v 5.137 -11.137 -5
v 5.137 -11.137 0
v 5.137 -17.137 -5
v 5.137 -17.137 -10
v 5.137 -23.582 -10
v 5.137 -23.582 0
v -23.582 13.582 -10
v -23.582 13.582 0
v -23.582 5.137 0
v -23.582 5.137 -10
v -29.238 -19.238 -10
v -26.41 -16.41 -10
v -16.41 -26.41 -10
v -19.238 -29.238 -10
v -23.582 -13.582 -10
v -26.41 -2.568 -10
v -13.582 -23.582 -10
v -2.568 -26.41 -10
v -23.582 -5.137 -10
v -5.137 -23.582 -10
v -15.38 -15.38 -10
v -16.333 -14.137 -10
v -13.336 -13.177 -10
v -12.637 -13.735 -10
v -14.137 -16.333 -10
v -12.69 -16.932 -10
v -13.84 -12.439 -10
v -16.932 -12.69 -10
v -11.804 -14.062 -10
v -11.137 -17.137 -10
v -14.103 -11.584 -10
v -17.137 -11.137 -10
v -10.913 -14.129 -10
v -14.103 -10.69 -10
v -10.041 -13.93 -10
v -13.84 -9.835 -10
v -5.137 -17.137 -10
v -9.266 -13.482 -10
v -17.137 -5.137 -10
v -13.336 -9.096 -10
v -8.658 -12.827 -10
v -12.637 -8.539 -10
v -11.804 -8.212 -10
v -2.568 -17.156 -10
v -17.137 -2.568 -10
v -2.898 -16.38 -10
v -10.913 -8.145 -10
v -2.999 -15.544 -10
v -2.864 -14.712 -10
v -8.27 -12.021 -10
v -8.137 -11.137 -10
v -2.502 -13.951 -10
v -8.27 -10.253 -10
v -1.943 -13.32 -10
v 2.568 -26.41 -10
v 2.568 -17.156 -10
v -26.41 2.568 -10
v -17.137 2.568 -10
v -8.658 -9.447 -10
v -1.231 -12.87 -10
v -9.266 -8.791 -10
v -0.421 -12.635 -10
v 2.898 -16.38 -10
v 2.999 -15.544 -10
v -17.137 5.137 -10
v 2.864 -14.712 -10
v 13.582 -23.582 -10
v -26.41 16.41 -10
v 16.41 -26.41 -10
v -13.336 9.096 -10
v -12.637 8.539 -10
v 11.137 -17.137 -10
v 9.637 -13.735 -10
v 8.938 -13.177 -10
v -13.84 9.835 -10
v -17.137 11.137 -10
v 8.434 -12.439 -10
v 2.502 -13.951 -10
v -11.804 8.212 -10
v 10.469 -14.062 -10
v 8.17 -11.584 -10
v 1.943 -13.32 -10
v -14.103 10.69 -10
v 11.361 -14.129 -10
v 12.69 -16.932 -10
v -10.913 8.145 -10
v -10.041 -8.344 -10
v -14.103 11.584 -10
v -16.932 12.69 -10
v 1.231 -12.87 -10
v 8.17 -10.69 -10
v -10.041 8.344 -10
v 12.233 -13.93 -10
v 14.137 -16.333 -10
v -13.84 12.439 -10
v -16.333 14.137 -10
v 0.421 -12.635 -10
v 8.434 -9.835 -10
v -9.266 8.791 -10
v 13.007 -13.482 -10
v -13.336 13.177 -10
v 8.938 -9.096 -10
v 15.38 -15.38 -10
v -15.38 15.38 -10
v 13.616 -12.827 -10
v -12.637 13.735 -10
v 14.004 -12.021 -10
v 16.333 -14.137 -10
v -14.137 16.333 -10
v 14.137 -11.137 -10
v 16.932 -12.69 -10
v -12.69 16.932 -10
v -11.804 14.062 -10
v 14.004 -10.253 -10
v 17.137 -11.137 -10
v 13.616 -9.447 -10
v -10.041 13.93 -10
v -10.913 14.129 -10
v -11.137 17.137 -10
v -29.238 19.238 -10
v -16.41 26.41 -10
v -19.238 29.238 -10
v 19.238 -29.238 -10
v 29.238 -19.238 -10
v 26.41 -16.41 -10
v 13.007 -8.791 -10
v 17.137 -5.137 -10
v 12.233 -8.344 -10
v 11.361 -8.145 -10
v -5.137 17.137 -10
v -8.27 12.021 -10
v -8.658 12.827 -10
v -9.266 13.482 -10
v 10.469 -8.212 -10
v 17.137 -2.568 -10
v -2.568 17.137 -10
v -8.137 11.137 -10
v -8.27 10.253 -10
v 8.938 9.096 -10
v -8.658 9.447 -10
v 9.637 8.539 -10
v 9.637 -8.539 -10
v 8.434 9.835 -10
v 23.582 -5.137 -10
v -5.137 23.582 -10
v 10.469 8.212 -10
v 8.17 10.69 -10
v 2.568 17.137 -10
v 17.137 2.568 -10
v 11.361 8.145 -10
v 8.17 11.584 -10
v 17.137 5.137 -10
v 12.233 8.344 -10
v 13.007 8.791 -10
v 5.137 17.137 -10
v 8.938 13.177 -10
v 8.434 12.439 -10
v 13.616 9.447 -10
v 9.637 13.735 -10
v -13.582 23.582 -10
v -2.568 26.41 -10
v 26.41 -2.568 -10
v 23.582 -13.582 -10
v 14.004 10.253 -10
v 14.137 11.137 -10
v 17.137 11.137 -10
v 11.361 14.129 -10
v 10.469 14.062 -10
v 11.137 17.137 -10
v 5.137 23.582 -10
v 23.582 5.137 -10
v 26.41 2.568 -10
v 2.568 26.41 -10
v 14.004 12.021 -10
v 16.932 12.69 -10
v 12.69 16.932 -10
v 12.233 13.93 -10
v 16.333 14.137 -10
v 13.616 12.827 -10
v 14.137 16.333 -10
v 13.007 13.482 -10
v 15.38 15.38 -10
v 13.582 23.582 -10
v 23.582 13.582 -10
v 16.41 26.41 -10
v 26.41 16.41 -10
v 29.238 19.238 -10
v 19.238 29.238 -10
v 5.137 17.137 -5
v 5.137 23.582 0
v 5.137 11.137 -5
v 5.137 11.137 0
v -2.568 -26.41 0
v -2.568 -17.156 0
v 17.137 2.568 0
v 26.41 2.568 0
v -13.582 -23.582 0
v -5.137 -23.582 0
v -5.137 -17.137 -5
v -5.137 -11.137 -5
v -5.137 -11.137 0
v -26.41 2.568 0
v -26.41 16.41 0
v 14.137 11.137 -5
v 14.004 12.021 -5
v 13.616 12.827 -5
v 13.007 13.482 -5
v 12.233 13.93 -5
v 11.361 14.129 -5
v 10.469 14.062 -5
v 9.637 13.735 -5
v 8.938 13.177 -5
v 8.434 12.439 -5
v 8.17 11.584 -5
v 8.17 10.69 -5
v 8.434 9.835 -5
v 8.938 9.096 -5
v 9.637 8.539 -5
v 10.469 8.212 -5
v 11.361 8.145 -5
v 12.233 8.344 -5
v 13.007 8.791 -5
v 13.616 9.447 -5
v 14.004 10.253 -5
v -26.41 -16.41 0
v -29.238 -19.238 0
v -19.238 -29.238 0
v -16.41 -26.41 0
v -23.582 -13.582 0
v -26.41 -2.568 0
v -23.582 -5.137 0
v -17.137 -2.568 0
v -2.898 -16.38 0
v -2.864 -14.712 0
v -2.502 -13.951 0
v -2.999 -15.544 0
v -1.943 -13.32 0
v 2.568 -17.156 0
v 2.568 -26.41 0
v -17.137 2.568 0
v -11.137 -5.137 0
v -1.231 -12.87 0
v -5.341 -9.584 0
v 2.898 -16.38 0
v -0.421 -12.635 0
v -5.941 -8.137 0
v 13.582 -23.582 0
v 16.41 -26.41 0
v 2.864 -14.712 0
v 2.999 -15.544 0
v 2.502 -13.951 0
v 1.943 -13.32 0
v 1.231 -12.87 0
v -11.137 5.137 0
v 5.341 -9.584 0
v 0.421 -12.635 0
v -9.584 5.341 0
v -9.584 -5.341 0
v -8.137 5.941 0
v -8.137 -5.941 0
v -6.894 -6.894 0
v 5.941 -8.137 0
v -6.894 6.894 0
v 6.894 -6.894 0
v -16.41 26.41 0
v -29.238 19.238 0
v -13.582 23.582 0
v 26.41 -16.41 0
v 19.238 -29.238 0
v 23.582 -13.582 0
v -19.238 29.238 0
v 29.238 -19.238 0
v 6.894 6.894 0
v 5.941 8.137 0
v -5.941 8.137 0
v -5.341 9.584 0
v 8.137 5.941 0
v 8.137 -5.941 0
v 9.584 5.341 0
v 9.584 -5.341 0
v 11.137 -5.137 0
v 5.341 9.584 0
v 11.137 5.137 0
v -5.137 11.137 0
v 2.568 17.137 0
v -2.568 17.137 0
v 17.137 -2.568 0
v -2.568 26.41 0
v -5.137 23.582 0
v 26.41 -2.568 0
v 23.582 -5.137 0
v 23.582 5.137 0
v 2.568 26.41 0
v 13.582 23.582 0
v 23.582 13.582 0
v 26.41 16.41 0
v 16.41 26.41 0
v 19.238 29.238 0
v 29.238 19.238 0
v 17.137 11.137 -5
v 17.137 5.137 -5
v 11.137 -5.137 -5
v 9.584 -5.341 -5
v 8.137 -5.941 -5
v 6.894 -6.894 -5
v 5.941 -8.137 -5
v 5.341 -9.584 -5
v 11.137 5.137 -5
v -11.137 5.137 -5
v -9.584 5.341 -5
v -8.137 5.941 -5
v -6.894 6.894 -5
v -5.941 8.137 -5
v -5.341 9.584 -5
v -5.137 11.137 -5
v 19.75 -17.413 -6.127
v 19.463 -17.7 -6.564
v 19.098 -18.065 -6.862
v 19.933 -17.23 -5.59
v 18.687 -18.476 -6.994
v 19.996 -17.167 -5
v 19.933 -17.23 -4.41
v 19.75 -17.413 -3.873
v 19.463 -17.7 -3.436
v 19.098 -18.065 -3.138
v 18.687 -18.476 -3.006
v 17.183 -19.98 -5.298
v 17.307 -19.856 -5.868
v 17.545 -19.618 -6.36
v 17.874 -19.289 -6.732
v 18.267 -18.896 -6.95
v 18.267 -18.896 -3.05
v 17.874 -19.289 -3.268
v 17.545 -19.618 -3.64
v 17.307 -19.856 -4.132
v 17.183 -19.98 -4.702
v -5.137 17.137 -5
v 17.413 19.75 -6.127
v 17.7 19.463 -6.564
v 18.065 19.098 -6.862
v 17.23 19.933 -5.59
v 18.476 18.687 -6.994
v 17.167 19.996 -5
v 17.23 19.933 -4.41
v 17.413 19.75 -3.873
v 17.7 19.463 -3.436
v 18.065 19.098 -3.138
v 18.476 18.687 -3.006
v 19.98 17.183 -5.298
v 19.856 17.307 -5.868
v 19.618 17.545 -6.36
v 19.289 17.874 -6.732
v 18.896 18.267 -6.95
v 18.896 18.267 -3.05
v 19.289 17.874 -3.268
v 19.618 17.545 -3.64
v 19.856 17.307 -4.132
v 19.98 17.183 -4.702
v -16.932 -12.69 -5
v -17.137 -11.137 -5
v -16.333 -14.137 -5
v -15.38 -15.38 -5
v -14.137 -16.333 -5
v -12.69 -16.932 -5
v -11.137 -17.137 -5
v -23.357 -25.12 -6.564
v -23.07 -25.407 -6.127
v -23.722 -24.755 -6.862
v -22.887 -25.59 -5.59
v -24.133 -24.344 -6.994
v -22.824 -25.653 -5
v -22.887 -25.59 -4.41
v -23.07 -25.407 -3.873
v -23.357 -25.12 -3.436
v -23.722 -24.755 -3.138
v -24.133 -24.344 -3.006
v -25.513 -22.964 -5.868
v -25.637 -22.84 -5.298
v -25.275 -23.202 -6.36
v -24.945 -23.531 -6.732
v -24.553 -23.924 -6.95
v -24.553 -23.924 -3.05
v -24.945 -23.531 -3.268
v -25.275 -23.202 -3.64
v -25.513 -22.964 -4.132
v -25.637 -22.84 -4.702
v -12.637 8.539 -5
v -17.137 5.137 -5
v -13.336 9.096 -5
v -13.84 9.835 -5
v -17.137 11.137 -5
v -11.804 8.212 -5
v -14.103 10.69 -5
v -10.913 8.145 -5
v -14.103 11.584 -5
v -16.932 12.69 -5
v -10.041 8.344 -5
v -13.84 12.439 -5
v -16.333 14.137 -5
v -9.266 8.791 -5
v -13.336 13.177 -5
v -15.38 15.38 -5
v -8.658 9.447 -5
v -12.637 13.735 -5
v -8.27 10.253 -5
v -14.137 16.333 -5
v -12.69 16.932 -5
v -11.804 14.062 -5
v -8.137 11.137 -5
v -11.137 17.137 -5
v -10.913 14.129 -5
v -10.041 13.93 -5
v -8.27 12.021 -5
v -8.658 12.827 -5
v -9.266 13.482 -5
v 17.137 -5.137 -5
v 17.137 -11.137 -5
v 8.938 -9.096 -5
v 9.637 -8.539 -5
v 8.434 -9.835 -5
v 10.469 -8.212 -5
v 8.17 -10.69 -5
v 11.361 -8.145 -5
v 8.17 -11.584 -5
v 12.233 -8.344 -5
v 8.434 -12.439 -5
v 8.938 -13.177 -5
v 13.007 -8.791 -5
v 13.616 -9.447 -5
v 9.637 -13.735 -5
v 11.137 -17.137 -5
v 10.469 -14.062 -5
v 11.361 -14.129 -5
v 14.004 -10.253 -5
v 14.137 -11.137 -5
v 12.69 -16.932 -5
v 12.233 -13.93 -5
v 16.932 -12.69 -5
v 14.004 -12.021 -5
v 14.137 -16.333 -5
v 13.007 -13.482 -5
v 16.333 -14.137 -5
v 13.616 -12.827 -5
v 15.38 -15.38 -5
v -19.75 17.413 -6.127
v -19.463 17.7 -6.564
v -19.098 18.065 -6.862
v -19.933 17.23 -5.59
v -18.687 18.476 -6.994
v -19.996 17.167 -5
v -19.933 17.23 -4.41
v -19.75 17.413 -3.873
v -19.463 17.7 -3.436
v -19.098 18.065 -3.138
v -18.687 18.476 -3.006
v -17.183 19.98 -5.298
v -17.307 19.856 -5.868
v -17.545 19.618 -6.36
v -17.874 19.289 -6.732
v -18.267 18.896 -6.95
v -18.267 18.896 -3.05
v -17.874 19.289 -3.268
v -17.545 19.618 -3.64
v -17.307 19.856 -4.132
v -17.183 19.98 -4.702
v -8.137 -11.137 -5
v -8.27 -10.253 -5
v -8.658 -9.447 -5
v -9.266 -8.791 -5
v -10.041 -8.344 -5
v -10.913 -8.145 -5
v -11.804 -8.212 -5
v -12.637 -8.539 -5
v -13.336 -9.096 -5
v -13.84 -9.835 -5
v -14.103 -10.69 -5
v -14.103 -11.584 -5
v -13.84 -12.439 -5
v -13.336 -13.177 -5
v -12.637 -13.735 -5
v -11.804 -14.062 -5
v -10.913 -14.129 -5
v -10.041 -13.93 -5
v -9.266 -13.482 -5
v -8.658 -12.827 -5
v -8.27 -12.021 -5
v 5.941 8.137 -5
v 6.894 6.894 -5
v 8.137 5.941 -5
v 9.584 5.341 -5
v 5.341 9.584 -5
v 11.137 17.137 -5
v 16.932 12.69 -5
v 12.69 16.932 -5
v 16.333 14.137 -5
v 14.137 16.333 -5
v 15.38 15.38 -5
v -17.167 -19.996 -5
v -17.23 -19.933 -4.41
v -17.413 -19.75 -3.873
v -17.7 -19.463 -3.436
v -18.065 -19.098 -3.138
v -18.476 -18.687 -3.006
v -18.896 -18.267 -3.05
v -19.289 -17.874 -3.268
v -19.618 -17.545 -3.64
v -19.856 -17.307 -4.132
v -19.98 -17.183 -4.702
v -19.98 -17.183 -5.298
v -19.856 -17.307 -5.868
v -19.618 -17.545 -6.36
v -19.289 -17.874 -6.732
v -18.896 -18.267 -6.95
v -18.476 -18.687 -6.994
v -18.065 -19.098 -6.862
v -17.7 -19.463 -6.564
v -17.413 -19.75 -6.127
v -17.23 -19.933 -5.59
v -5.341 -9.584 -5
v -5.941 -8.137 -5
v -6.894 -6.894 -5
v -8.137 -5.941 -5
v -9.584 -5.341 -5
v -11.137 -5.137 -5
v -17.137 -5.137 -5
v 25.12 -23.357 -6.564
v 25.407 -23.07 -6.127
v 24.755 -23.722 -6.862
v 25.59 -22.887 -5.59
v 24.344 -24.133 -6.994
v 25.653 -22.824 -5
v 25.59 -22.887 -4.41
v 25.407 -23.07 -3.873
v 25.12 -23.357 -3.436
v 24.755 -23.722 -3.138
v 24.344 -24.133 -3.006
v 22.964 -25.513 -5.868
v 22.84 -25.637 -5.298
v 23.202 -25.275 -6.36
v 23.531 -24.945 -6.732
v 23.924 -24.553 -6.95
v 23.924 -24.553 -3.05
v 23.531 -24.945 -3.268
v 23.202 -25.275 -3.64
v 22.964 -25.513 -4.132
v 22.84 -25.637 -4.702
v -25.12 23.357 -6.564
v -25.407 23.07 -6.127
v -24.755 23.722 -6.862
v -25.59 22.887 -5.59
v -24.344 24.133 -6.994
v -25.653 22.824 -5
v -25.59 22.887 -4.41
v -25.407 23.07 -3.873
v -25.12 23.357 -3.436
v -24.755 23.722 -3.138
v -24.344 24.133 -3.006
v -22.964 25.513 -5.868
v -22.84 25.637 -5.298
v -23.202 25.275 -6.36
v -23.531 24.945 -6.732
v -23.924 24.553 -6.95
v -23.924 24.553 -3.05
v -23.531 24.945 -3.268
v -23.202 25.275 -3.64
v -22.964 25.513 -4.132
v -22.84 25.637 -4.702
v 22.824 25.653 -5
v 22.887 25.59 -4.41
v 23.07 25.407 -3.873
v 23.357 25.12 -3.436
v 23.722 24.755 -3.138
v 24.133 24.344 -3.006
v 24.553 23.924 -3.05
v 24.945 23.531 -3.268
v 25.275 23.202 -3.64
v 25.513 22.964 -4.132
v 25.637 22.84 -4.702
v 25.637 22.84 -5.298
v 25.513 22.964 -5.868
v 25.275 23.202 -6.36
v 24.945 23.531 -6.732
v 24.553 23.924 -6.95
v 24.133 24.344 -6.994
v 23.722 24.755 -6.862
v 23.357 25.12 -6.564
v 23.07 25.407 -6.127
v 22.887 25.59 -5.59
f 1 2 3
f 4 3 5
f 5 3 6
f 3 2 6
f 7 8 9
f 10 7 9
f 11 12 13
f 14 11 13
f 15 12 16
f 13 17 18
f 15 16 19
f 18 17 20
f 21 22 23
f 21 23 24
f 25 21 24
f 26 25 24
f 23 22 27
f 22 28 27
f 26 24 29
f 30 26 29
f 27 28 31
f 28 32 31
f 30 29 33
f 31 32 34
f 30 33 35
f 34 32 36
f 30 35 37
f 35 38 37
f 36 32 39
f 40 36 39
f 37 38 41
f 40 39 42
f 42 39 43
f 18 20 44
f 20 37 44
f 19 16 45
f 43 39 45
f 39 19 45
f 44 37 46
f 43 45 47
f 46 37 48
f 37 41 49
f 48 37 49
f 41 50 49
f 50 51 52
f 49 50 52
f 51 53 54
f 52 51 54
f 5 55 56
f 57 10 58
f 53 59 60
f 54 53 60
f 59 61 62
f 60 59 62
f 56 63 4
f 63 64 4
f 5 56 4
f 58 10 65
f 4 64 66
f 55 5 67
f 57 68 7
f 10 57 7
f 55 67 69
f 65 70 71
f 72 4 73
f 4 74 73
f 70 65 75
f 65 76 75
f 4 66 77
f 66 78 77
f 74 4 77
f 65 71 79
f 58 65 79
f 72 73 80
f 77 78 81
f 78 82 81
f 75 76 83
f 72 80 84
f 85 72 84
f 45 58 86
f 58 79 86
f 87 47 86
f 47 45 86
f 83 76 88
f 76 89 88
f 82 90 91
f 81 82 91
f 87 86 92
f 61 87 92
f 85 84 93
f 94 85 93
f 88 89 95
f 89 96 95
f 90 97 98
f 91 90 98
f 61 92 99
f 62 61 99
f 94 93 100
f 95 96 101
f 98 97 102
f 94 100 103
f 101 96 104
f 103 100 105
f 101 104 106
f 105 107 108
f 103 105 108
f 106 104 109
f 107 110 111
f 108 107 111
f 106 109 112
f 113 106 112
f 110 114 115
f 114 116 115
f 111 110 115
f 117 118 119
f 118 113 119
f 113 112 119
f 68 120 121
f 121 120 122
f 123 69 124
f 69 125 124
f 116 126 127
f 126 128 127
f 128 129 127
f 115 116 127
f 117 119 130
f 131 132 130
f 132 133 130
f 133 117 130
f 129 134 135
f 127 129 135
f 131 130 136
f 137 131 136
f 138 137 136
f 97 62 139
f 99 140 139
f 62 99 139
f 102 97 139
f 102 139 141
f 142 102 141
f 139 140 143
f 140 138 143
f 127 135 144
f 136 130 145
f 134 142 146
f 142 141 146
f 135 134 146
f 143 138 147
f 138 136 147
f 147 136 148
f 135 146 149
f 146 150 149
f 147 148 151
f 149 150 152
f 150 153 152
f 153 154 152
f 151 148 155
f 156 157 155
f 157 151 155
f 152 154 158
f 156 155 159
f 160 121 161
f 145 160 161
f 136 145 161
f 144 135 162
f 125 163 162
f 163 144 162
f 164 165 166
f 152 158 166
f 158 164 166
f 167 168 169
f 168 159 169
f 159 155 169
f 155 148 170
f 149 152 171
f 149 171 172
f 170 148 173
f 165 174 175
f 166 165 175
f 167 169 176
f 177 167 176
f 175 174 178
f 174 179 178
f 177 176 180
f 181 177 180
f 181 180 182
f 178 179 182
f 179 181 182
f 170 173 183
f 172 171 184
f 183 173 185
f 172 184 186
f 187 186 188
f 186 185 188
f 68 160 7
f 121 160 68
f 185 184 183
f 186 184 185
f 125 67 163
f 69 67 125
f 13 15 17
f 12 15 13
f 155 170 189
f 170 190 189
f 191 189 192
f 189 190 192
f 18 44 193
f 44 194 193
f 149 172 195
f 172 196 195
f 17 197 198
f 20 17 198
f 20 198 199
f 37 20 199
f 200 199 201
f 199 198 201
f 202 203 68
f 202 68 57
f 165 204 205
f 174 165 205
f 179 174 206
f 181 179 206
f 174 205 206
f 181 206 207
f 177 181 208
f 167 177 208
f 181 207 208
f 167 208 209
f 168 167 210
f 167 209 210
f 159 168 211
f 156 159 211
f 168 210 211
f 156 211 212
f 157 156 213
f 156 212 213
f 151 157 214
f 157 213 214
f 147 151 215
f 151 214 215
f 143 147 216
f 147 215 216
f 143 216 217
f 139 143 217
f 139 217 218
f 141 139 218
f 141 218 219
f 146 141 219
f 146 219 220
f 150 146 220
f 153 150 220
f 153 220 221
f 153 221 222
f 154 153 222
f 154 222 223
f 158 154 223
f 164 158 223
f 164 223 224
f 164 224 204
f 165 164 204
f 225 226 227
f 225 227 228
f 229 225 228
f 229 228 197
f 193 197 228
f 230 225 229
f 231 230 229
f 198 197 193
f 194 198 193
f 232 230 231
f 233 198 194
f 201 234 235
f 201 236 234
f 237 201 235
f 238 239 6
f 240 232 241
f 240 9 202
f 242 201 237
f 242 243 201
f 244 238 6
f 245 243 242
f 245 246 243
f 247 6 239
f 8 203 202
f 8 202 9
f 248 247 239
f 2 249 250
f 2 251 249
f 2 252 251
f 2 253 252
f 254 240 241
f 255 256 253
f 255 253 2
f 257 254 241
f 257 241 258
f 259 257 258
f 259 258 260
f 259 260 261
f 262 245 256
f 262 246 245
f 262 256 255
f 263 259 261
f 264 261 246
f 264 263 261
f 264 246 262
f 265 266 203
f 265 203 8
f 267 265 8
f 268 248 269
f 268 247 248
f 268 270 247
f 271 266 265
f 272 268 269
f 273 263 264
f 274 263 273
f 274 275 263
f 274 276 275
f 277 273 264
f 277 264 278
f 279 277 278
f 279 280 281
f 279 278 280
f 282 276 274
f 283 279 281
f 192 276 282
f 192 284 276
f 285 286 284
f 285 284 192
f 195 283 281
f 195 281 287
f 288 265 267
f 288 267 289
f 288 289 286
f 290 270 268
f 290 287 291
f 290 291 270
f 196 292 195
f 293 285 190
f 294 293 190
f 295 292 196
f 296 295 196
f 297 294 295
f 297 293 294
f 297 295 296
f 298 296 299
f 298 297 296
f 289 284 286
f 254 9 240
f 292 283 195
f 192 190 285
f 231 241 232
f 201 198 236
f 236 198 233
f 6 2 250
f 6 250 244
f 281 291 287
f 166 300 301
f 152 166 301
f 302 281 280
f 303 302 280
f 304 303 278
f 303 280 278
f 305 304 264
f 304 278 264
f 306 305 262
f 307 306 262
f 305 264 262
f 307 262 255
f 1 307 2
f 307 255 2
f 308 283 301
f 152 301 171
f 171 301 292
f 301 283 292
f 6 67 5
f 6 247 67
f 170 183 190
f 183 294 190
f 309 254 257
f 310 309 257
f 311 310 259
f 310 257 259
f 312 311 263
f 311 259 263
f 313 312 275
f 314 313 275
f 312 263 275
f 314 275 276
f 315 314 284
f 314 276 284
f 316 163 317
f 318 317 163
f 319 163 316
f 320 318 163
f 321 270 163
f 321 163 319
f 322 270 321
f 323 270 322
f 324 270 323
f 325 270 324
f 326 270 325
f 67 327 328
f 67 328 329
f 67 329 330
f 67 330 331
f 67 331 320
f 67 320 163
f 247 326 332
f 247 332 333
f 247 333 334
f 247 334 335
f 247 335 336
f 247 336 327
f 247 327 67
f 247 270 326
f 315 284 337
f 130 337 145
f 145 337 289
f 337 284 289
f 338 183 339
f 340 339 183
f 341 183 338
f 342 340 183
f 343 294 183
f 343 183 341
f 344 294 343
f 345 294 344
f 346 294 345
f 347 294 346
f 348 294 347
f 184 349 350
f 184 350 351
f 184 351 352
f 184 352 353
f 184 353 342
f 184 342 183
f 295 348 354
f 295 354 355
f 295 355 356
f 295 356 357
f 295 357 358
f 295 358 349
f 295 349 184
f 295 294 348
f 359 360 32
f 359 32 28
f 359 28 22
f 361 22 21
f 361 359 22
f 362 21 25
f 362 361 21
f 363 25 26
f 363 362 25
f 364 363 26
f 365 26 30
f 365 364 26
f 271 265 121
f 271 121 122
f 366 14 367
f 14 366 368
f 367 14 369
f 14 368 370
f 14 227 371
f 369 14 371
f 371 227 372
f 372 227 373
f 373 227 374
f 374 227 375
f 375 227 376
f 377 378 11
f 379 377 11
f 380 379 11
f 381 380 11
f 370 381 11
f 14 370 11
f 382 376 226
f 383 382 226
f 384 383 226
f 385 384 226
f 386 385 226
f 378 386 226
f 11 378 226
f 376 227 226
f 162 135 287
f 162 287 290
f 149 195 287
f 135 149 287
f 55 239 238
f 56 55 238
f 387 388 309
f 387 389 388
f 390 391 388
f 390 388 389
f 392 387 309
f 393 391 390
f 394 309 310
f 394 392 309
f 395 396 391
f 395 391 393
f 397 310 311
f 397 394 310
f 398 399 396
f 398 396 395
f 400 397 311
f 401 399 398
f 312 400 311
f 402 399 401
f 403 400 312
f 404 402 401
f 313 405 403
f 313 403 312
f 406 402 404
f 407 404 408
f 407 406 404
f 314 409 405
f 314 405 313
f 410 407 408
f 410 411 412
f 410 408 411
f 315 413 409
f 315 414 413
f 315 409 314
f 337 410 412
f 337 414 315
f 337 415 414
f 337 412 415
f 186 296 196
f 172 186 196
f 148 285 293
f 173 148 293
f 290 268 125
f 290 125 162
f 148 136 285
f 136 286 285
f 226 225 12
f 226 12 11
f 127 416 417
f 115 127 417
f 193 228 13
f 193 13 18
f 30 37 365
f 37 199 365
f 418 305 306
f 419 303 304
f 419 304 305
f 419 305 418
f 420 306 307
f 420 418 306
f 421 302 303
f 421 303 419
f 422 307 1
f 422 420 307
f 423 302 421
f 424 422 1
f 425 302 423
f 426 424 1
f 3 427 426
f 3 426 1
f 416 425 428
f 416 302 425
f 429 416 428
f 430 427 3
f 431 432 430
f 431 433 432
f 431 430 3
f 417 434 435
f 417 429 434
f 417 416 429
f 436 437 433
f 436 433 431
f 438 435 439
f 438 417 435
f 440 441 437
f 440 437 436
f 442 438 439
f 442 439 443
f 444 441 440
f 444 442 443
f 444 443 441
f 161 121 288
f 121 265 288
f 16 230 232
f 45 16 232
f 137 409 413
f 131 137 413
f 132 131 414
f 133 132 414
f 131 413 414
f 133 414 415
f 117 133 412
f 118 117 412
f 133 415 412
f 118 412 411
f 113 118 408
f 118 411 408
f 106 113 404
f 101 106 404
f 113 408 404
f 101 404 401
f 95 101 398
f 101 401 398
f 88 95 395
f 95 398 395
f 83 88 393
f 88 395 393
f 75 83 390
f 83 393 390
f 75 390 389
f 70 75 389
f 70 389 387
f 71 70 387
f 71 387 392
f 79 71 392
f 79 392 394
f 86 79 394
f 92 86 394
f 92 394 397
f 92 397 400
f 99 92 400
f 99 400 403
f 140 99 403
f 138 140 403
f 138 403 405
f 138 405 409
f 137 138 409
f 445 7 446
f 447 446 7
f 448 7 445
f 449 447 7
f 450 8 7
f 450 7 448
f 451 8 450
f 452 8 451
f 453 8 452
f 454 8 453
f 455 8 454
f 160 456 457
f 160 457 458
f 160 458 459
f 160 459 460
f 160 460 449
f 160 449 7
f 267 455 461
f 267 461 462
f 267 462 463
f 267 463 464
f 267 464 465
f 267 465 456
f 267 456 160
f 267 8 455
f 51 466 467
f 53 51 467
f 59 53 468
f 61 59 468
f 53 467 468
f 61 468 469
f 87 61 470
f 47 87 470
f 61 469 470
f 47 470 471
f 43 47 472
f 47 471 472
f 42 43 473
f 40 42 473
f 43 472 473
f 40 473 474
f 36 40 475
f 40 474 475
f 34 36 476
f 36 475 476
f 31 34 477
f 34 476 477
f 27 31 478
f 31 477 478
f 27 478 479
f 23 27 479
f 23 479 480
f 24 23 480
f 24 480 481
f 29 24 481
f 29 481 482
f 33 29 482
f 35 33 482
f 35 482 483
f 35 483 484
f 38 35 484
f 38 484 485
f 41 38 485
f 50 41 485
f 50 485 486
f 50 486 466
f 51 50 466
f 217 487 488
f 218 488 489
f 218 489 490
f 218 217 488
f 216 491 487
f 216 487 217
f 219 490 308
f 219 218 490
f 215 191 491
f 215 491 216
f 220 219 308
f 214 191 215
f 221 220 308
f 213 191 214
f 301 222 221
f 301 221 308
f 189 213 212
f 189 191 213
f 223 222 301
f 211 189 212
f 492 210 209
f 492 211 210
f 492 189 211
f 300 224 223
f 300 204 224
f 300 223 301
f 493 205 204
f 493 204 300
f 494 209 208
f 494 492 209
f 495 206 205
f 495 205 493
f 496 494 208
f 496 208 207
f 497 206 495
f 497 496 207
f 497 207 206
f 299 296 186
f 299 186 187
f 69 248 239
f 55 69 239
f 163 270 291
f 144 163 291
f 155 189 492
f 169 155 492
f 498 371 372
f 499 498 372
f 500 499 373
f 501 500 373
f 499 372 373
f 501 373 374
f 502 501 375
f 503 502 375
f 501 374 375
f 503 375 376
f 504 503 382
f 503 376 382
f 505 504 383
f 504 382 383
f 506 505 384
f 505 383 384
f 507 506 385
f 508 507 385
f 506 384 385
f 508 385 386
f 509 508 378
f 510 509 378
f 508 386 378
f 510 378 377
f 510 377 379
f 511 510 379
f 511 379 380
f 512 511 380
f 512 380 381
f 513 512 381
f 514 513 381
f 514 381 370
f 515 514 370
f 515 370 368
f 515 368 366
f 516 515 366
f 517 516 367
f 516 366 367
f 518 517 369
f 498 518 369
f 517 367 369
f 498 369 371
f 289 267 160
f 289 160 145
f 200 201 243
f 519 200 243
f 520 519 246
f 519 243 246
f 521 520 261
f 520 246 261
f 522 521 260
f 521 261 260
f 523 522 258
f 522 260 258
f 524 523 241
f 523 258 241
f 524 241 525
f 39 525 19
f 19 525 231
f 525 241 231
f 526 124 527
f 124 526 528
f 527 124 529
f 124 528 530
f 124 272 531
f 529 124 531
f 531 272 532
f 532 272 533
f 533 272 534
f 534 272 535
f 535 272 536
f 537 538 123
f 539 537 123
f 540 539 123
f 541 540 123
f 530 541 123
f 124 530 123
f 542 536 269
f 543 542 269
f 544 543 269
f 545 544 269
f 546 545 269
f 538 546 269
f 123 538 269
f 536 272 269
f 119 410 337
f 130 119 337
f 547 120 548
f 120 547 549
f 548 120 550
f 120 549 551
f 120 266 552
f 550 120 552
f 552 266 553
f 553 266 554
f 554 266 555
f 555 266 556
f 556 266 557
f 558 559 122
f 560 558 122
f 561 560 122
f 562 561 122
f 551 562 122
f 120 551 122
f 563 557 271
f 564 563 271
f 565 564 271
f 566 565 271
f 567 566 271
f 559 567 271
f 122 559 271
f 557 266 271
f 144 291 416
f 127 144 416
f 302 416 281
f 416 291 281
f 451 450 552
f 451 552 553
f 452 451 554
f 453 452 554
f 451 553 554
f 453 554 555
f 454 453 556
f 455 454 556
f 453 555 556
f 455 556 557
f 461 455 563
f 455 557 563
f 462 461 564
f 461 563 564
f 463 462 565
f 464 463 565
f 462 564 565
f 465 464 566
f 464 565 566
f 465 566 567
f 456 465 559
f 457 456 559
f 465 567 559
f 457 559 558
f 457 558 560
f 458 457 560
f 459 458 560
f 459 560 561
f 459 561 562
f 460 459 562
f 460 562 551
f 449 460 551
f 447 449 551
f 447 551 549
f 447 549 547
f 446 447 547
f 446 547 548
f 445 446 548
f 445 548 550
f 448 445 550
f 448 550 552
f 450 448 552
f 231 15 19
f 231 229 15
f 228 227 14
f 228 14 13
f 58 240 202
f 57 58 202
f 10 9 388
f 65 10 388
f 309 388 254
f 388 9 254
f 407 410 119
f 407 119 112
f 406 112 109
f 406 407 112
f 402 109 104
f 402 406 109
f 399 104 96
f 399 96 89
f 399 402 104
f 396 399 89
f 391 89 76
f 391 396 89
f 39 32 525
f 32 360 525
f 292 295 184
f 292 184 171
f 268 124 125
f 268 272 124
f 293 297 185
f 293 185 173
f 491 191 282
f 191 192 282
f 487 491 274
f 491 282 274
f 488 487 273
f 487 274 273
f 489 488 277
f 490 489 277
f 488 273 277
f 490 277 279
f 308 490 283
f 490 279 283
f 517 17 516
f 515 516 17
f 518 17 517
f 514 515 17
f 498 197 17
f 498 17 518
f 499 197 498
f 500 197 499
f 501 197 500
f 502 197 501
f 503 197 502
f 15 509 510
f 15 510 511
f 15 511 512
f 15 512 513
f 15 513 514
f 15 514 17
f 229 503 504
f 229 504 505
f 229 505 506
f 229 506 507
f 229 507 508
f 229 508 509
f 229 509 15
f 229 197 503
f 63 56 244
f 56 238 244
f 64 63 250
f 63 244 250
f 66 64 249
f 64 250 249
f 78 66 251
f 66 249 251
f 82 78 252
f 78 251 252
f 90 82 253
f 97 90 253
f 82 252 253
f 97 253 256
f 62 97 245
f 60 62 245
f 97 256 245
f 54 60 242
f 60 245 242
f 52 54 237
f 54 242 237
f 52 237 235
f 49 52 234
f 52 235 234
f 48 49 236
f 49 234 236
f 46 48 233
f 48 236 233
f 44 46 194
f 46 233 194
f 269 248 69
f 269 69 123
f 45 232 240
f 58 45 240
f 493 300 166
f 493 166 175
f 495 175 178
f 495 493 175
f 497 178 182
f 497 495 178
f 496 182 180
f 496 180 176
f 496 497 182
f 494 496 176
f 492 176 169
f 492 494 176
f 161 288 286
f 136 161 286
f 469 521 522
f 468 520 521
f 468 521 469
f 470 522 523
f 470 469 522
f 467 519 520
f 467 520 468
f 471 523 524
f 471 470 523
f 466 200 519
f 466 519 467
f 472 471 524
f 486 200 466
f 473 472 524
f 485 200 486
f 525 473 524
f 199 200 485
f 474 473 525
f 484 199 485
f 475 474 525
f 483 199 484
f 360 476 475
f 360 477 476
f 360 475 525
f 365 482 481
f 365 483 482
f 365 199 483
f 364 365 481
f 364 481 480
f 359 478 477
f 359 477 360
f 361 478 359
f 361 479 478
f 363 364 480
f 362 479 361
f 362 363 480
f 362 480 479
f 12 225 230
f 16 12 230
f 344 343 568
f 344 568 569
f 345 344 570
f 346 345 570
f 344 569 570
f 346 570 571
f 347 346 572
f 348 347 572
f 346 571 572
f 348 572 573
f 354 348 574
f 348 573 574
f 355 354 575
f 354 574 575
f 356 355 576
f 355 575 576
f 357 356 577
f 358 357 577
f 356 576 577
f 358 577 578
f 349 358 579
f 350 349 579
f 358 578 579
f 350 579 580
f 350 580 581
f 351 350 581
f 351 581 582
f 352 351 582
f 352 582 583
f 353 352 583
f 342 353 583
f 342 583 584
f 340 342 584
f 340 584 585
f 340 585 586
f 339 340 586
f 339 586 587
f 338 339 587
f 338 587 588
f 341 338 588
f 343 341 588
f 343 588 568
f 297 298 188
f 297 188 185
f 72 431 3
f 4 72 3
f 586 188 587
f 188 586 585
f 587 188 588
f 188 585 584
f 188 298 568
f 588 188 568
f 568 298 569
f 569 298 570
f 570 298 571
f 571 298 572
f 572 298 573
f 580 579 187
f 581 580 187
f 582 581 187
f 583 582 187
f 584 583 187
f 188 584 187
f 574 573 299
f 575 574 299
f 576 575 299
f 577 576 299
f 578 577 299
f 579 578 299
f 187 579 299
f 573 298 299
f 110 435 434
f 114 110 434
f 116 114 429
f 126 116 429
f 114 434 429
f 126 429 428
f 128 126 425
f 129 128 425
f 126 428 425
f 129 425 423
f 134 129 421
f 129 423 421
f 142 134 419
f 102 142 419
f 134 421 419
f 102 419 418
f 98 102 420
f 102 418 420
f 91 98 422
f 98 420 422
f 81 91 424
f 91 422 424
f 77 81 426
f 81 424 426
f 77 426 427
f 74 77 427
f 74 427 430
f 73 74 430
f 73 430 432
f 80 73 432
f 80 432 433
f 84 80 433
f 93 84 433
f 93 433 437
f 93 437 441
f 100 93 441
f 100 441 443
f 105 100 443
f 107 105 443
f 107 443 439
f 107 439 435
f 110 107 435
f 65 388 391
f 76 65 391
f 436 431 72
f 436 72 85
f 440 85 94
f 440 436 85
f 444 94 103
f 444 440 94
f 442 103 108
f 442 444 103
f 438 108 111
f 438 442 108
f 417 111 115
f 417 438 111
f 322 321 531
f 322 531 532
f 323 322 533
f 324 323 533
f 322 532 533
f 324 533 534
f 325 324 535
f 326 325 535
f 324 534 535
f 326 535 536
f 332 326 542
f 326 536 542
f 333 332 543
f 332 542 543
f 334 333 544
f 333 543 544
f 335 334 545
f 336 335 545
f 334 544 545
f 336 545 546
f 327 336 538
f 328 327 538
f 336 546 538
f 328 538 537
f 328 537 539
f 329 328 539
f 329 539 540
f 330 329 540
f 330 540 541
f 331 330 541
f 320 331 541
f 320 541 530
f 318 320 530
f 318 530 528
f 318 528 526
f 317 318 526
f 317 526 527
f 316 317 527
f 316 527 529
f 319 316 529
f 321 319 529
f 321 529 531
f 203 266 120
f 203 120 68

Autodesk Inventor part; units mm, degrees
ref_plane "YZ Plane" through (0, 0, 0) normal (1, 0, 0) x (0, 1, 0)
ref_plane "XZ Plane" through (0, 0, 0) normal (0, 1, 0) x (-1, 0, 0)
ref_plane "XY Plane" through (0, 0, 0) normal (0, 0, 1) x (1, 0, 0)
sketch "Sketch1" plane through (0, 0, 0) normal (0, 0, 1) x (1, 0, 0)
  line L0 (-11.1369, 11.1369) -> (11.1369, 11.1369) construction
  line L1 (11.1369, 11.1369) -> (11.1369, -11.1369) construction
  line L2 (11.1369, -11.1369) -> (-11.1369, -11.1369) construction
  line L3 (-11.1369, -11.1369) -> (-11.1369, 11.1369) construction
  line L4 (-11.1369, 11.1369) -> (11.1369, -11.1369) construction
  line L5 (11.1369, 11.1369) -> (-11.1369, -11.1369) construction
  circle A0 centre (-11.1369, 11.1369) radius 3
  circle A1 centre (11.1369, 11.1369) radius 3
  circle A2 centre (-11.1369, -11.1369) radius 3
  circle A3 centre (0, -15.6056) radius 3
  circle A4 centre (11.1369, -11.1369) radius 3
  line L6 (-11.1369, -11.1369) -> (0, -15.6056) construction
  line L7 (0, -15.6056) -> (11.1369, -11.1369) construction
  line L8 (0, 0) -> (0, 30.7503) construction
  circle A5 centre (-11.1369, 11.1369) radius 6
  circle A6 centre (-11.1369, -11.1369) radius 6
  circle A7 centre (11.1369, -11.1369) radius 6
  circle A8 centre (11.1369, 11.1369) radius 6
  line L9 (-19.2384, -29.2384) -> (19.2384, -29.2384)
  line L10 (29.2384, -19.2384) -> (29.2384, 19.2384)
  line L11 (19.2384, 29.2384) -> (-19.2384, 29.2384)
  line L12 (-29.2384, 19.2384) -> (-29.2384, -19.2384)
  line L13 (-29.2384, -29.2384) -> (29.2384, 29.2384) construction
  line L14 (29.2384, -29.2384) -> (-29.2384, 29.2384) construction
  line L15 (-29.2384, 19.2384) -> (-19.2384, 29.2384)
  line L16 (19.2384, 29.2384) -> (29.2384, 19.2384)
  line L17 (29.2384, -19.2384) -> (19.2384, -29.2384)
  line L18 (-19.2384, -29.2384) -> (-29.2384, -19.2384)
  circle A9 centre (0, 0) radius 35 construction
  point P0 (0, 0)
  point P1 (25, 0)
  point P2 (0, 0)
  dimension "d31" = 70
  dimension "d2" = 31.5
  dimension "d4" = 6
  dimension "d5" = 6
  dimension "d6" = 12
  dimension "d18" = 12
  dimension "d21" = 10
  dimension "d22" = 10
  dimension "d23" = 10
  dimension "d24" = 10
  dimension "d25" = 10
  dimension "d26" = 10
  dimension "d27" = 10
  dimension "d28" = 10
extrude "Extrusion1" add sketch "Sketch1" against normal blind 10 contours A5 | A6 | A7 | A8 | L18 L12 L15 L11 L16 L10 L17 L9
extrude "Extrusion3" cut sketch "Sketch1" against normal blind 5 contours A0 | A1 | A2 | A4 | A5 | A6 | A7 | A8
sketch "Sketch3" plane through (0, 0, 0) normal (0, 0, 1) x (1, 0, 0)
  circle A0 centre (-11.1369, -11.1369) radius 6 projected
  circle A1 centre (11.1369, -11.1369) radius 6 projected
  circle A2 centre (-11.1369, 11.1369) radius 6 projected
  circle A3 centre (11.1369, 11.1369) radius 6 projected
  line L0 (-29.2384, -19.2384) -> (-19.2384, -29.2384) projected
  line L1 (-19.2384, -29.2384) -> (19.2384, -29.2384) projected
  line L2 (19.2384, -29.2384) -> (29.2384, -19.2384) projected
  line L3 (29.2384, -19.2384) -> (29.2384, 19.2384) projected
  line L4 (29.2384, 19.2384) -> (19.2384, 29.2384) projected
  line L5 (19.2384, 29.2384) -> (-19.2384, 29.2384) projected
  line L6 (-19.2384, 29.2384) -> (-29.2384, 19.2384) projected
  line L7 (-29.2384, 19.2384) -> (-29.2384, -19.2384) projected
  circle A4 centre (0, -15.6056) radius 3 projected
  line L8 (19.2384, 29.2384) -> (16.41, 26.41)
  line L9 (13.5815, 23.5815) -> (23.5815, 13.5815)
  line L10 (23.5815, 13.5815) -> (26.41, 16.41) construction
  line L11 (29.2384, 19.2384) -> (29.2384, -19.2384) projected
  line L12 (29.2384, 19.2384) -> (19.2384, 29.2384) projected
  line L13 (23.5815, 13.5815) -> (23.5815, 5.1369)
  circle A5 centre (11.1369, 11.1369) radius 6 projected
  line L14 (26.41, 16.41) -> (26.41, 2.5685)
  line L15 (26.41, 16.41) -> (29.2384, 19.2384)
  line L16 (17.1369, 11.1369) -> (17.1369, 5.1369)
  line L17 (17.1369, 5.1369) -> (23.5815, 5.1369)
  line L18 (0, 0) -> (17.1369, 0) construction
  line L19 (16.41, 26.41) -> (2.5685, 26.41)
  line L20 (0, 17.1369) -> (0, 0) construction
  line L21 (16.41, 26.41) -> (13.5815, 23.5815) construction
  line L22 (13.5815, 23.5815) -> (5.1369, 23.5815)
  line L23 (5.1369, 23.5815) -> (5.1369, 17.1369)
  line L24 (5.1369, 17.1369) -> (11.1369, 17.1369)
  circle A6 centre (11.1369, 11.1369) radius 6 projected
  line L25 (0, 17.1369) -> (0, 29.2384)
  line L26 (19.2384, 29.2384) -> (-19.2384, 29.2384) projected
  line L27 (17.1369, 0) -> (29.2384, 0)
  line L28 (2.5685, 17.1369) -> (2.5685, 26.41)
  line L29 (0, 17.1369) -> (2.5685, 17.1369)
  line L30 (2.5685, 17.1369) -> (5.1369, 17.1369) construction
  line L31 (26.41, 2.5685) -> (17.1369, 2.5685)
  line L32 (17.1369, 2.5685) -> (17.1369, 0)
  line L33 (17.1369, 2.5685) -> (17.1369, 5.1369) construction
  dimension "d38" = 8
extrude "Extrusion5" cut sketch "Sketch3" against normal through all contours A3 L24 L23 L22 L9 L13 L17 L16 | L5 L8 L19 L28 L29 L25 | L27 L32 L31 L14 L15 L3
sketch "Sketch4" plane through (0, 0, -5) normal (0, 0, 1) x (1, 0, 0)
  circle A0 centre (11.1369, 11.1369) radius 3 projected
  arc A1 (11.1369, 17.1369) -> (17.1369, 11.1369) centre (11.1369, 11.1369) ccw projected
  arc A2 (17.1369, 11.1369) -> (11.1369, 17.1369) centre (11.1369, 11.1369) ccw projected
  line L0 (17.1369, 11.1369) -> (17.1369, 5.1369) projected
  line L1 (17.1369, 5.1369) -> (17.1369, 11.1369) projected
  line L2 (5.1369, 17.1369) -> (11.1369, 17.1369) projected
  line L3 (11.1369, 17.1369) -> (5.1369, 17.1369) projected
  line L4 (17.1369, 5.1369) -> (11.1369, 5.1369)
  line L5 (5.1369, 17.1369) -> (11.1369, 17.1369) projected
  line L6 (5.1369, 17.1369) -> (5.1369, 11.1369)
  point P0 (0, 0)
extrude "Extrusion6" cut sketch "Sketch4" along normal through all contours A1 L6 L2 | L0 L4 A1
pattern_circular "Circular Pattern2" count 4 over 360 about axis through (0, 0, -10) along (0, 0, 1) of "Extrusion5", "Extrusion6"
sketch "Sketch2" plane through (29.2384, 19.2384, -10) normal (0.7071, 0.7071, 0) x (-0.7071, 0.7071, 0)
  line L0 (0, 10) -> (0, 0) construction
  line L1 (14.1421, 0) -> (0, 0) construction
  line L2 (14.1421, 10) -> (14.1421, 0) construction
  line L3 (0, 10) -> (14.1421, 10) construction
  line L4 (14.1421, 10) -> (0, 0) construction
  circle A0 centre (7.0711, 5) radius 2
  point P0 (7.0711, 10)
  dimension "d32" = 4
extrude "Extrusion4" cut sketch "Sketch2" against normal up to next
pattern_circular "Circular Pattern1" count 4 over 360 about axis through (0, 0, -10) along (0, 0, 1) of "Extrusion4"
equation "\"d22\" = d21"
equation "\"d23\" = d21"
equation "\"d24\" = d23"
equation "\"d25\" = d21"
equation "\"d26\" = d25"
equation "\"d27\" = d21"
equation "\"d28\" = d27"
properties part number "Interface Block" material "ABS Plastic"
